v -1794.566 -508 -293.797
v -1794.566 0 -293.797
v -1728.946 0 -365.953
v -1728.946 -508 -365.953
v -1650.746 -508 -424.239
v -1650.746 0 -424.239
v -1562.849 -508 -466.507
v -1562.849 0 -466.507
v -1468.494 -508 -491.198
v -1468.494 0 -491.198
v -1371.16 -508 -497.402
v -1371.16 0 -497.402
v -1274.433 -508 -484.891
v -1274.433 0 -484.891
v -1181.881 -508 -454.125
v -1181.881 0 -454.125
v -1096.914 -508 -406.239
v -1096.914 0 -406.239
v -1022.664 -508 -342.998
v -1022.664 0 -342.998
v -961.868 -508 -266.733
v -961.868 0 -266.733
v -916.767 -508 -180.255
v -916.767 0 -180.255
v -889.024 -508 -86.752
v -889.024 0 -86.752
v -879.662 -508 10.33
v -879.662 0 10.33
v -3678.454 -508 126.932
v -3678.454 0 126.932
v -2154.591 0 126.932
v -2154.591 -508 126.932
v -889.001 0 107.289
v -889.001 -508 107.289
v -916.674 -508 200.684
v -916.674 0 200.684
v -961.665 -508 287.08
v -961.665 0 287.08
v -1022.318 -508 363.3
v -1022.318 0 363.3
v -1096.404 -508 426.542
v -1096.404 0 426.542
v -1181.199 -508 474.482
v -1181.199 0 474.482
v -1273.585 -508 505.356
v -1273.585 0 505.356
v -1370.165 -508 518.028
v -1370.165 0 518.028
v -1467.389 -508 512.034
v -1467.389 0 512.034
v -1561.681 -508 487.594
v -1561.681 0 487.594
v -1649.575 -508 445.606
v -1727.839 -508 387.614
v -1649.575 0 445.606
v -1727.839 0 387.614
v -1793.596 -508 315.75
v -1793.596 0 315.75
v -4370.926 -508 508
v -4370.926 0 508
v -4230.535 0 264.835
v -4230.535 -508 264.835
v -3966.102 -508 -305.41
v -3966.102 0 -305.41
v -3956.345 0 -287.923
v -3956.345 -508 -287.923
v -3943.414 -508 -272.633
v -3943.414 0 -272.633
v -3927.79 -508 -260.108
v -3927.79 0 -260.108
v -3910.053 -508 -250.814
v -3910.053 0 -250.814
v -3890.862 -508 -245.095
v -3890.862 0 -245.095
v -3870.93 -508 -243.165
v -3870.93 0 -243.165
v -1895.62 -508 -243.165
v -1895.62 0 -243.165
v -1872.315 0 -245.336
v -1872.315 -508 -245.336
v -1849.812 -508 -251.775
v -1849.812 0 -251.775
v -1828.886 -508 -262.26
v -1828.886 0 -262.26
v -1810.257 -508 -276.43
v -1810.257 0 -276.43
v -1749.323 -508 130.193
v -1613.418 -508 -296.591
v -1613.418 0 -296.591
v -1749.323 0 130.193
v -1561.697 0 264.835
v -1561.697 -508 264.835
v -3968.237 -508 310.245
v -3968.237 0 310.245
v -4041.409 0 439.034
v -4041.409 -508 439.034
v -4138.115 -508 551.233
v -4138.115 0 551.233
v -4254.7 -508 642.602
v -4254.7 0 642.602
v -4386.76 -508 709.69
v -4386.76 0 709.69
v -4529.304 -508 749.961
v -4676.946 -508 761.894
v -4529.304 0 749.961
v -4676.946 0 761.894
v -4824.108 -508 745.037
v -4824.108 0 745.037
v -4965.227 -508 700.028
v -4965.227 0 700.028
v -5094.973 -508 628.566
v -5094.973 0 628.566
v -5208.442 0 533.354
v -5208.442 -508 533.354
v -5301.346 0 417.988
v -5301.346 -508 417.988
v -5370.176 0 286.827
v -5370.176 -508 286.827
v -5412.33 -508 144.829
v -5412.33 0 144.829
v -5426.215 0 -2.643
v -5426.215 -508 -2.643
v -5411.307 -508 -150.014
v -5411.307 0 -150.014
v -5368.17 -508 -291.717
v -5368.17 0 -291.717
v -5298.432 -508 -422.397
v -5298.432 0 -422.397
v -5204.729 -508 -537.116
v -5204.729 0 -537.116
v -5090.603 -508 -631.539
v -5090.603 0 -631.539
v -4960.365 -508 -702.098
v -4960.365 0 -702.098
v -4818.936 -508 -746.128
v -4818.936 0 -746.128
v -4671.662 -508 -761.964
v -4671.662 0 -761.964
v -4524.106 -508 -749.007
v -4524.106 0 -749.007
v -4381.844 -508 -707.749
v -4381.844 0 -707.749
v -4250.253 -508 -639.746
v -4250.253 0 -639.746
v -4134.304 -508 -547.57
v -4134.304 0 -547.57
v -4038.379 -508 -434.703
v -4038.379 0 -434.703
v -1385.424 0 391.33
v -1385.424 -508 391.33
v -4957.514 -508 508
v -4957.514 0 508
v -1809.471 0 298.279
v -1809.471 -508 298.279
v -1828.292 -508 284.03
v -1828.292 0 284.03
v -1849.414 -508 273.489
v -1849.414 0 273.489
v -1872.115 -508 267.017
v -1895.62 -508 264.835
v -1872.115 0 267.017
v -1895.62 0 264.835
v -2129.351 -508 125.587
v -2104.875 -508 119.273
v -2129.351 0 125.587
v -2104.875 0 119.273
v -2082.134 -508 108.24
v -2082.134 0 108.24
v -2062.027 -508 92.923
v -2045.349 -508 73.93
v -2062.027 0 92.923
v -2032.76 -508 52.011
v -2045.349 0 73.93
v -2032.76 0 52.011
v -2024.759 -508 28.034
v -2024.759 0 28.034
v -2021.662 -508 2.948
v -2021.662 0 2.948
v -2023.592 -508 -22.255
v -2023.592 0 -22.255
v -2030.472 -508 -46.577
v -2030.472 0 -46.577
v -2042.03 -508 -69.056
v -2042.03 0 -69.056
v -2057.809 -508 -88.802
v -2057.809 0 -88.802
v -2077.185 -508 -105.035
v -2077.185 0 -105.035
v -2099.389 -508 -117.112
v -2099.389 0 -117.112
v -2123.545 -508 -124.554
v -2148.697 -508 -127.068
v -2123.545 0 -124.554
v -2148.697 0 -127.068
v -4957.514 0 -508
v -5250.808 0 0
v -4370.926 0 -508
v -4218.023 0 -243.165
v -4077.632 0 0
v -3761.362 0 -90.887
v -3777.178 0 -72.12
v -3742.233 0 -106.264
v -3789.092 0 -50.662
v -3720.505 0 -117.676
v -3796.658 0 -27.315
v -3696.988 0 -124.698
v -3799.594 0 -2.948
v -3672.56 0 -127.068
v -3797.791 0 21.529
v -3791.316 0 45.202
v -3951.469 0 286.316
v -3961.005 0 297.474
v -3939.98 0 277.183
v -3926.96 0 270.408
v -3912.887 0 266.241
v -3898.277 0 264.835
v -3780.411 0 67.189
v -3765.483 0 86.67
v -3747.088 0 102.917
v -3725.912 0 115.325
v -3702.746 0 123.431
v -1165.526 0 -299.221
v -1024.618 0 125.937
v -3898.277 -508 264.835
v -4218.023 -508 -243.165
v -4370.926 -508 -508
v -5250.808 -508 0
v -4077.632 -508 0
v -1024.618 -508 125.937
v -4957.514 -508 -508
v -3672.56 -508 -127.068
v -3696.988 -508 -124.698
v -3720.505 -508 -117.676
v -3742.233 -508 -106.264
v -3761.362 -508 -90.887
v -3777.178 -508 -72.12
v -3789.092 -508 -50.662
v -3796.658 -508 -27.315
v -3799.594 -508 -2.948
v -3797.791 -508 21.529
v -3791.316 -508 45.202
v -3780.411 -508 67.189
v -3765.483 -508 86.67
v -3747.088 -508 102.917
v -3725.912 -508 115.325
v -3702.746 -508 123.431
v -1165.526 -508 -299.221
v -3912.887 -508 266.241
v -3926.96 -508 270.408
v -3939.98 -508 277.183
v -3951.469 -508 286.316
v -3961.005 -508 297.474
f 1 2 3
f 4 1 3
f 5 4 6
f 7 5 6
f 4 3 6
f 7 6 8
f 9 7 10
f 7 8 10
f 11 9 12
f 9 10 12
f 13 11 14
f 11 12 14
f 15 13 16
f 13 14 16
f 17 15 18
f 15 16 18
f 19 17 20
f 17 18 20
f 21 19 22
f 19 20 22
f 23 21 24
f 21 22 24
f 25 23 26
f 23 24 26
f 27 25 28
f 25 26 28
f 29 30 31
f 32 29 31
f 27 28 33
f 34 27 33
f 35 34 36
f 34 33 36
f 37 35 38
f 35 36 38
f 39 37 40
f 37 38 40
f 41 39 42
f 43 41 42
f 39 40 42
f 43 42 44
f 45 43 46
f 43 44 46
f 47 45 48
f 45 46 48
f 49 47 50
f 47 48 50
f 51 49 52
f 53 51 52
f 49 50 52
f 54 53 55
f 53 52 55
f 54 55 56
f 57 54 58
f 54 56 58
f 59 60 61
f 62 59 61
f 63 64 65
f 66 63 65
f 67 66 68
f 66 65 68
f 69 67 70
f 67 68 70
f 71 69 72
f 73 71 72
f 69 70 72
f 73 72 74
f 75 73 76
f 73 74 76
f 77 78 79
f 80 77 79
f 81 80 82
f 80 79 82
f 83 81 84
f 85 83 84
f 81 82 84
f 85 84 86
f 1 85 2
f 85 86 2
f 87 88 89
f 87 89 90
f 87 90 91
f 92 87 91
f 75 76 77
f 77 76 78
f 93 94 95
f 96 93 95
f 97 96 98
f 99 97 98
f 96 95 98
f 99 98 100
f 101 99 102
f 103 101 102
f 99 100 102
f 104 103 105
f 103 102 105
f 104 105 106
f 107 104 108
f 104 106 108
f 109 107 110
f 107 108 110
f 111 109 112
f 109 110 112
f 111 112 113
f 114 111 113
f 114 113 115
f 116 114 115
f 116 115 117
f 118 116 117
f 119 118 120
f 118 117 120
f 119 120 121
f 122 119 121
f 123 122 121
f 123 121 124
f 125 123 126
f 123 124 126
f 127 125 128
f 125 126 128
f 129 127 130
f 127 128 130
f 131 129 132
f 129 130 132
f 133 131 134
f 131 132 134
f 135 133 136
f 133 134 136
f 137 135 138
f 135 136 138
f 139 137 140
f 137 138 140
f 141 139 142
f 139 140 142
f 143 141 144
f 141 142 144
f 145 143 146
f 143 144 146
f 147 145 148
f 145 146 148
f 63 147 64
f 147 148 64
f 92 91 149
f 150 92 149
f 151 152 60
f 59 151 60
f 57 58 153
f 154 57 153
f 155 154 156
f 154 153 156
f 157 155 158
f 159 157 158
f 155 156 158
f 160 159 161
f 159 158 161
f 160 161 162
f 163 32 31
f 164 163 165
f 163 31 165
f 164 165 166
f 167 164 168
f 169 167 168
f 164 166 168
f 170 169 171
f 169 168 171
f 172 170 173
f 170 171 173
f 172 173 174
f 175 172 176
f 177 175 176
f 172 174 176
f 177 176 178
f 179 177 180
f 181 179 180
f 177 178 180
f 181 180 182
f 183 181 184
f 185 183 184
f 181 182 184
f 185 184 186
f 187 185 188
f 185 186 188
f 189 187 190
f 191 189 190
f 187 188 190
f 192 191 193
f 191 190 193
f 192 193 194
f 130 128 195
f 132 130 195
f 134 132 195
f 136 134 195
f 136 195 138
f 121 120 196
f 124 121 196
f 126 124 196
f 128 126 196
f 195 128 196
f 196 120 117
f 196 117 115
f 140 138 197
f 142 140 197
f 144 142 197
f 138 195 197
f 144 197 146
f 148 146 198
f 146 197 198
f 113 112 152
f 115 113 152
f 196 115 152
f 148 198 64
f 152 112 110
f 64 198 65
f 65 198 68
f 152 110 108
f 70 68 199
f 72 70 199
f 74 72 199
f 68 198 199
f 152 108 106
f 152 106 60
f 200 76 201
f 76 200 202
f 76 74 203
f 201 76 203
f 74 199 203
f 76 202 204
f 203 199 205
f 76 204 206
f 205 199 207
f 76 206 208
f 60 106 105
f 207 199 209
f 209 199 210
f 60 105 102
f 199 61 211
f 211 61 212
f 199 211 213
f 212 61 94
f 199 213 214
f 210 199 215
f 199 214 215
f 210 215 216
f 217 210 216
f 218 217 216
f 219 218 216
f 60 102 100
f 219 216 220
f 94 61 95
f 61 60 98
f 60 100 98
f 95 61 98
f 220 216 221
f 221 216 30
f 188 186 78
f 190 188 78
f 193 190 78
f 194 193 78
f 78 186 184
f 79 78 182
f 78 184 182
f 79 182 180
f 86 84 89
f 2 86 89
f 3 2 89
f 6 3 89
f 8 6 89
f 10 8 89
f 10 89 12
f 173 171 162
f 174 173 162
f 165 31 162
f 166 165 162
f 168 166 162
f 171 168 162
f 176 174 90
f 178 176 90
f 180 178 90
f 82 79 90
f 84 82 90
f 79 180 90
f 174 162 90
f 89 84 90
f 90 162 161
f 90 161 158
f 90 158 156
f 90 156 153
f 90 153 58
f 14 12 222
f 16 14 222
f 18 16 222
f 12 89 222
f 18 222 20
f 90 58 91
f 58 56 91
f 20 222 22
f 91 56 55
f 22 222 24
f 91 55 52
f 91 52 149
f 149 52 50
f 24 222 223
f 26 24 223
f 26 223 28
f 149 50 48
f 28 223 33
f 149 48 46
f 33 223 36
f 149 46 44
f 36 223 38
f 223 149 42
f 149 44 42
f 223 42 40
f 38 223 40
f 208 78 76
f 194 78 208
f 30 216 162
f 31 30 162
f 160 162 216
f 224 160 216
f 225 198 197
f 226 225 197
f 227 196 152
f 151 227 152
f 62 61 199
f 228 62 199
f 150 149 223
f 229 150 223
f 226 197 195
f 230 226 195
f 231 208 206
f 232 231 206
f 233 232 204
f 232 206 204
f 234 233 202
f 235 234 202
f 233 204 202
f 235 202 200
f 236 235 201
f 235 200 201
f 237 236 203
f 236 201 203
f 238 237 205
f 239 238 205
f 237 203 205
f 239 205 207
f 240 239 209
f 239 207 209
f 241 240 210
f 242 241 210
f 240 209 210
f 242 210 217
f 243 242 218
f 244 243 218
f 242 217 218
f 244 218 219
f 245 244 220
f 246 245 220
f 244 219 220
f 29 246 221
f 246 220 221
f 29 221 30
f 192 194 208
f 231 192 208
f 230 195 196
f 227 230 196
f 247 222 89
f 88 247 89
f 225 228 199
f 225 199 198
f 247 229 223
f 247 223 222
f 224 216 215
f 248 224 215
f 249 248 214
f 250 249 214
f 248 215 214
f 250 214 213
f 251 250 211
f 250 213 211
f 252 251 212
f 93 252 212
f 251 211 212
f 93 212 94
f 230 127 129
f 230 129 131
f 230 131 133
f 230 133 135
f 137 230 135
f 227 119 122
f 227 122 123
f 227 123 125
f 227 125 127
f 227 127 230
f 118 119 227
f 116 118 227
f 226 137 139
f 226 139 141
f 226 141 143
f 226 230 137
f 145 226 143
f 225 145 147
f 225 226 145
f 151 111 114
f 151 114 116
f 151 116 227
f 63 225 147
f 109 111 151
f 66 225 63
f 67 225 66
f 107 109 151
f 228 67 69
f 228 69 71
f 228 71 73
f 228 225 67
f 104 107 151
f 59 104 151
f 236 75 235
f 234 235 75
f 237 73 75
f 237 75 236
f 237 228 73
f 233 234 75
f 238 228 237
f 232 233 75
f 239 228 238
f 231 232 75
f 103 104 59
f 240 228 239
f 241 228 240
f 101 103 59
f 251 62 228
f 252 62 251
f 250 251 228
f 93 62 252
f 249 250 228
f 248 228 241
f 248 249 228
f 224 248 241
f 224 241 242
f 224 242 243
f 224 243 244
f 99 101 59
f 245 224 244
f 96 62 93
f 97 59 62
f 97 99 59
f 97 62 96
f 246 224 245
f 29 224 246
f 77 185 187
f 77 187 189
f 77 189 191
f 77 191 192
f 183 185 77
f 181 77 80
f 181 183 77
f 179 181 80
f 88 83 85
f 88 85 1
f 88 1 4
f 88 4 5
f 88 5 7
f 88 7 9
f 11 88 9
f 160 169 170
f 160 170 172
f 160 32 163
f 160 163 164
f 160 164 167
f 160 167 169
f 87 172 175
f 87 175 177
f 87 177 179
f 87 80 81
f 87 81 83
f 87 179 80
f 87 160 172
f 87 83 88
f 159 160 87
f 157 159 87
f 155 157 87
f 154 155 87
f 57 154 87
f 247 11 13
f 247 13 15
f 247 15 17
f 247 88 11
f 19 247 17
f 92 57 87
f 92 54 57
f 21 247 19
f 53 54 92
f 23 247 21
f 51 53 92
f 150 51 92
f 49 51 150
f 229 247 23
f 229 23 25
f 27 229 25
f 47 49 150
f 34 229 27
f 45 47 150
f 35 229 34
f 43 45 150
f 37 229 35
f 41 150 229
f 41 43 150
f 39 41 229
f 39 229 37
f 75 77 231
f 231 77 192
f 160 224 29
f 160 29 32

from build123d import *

# Parameters (mm, degrees)
F1_DEPTH = 508


with BuildPart() as f1:
    # F0 (on Front) → F1 (new body)
    with BuildSketch(Plane.XZ):
        with BuildLine():
            ThreePointArc((-3968.237199, 310.245178), (-3918.906945, 158.595676), (-3902.219907, 0))
            ThreePointArc((-3902.219907, 0), (-3918.361418, -156.009984), (-3966.102099, -305.410422))
            ThreePointArc((-3966.102099, -305.410422), (-3927.789952, -260.10813), (-3870.930023, -243.165085))
            Line((-3870.930023, -243.165085), (-1895.619907, -243.165085))
            ThreePointArc((-1895.619907, -243.165085), (-1839.105599, -256.531011), (-1794.565934, -293.796724))
            ThreePointArc((-1794.565934, -293.796724), (-1895.661012, 11.138058), (-1793.59604, 315.749577))
            ThreePointArc((-1793.59604, 315.749577), (-1838.608566, 278.270506), (-1895.619907, 264.834915))
            Line((-1895.619907, 264.834915), (-3898.27722, 264.834915))
            ThreePointArc((-3898.27722, 264.834915), (-3939.98001, 277.182763), (-3968.237199, 310.245178))
        make_face()
        with BuildLine():
            ThreePointArc((-3672.559767, -127.0684), (-3799.593962, -2.948124), (-3678.454427, 126.9316))
            Line((-3678.454427, 126.9316), (-2154.591227, 126.9316))
            ThreePointArc((-2154.591227, 126.9316), (-2021.662371, 2.948124), (-2148.696566, -127.0684))
            Line((-2148.696566, -127.0684), (-3672.559767, -127.0684))
        make_face(mode=Mode.SUBTRACT)
        with BuildLine():
            ThreePointArc((-3966.102099, -305.410422), (-3918.361418, -156.009984), (-3902.219907, 0))
            ThreePointArc((-3902.219907, 0), (-3918.906945, 158.595676), (-3968.237199, 310.245178))
            ThreePointArc((-3968.237199, 310.245178), (-5426.215325, -2.642609), (-3966.102099, -305.410422))
        make_face()
        Polygon((-4230.534543, 264.834915), (-4077.632034, 0), (-4218.023461, -243.165085), (-4370.92597, -508), (-4957.513844, -508), (-5250.807781, 0), (-4957.513844, 508), (-4370.92597, 508), align=None, mode=Mode.SUBTRACT)
        with BuildLine():
            ThreePointArc((-879.661655, 10.329742), (-1226.65027, 492.138142), (-1793.59604, 315.749577))
            ThreePointArc((-1793.59604, 315.749577), (-1895.661012, 11.138058), (-1794.565934, -293.796724))
            ThreePointArc((-1794.565934, -293.796724), (-1227.417114, -471.734244), (-879.661655, 10.329742))
        make_face()
        Polygon((-1024.617689, 125.937205), (-1165.52567, -299.220916), (-1613.418032, -296.590548), (-1749.322755, 130.19323), (-1561.697043, 264.834915), (-1385.42413, 391.329742), align=None, mode=Mode.SUBTRACT)
    extrude(amount=F1_DEPTH)


solid = f1.part
